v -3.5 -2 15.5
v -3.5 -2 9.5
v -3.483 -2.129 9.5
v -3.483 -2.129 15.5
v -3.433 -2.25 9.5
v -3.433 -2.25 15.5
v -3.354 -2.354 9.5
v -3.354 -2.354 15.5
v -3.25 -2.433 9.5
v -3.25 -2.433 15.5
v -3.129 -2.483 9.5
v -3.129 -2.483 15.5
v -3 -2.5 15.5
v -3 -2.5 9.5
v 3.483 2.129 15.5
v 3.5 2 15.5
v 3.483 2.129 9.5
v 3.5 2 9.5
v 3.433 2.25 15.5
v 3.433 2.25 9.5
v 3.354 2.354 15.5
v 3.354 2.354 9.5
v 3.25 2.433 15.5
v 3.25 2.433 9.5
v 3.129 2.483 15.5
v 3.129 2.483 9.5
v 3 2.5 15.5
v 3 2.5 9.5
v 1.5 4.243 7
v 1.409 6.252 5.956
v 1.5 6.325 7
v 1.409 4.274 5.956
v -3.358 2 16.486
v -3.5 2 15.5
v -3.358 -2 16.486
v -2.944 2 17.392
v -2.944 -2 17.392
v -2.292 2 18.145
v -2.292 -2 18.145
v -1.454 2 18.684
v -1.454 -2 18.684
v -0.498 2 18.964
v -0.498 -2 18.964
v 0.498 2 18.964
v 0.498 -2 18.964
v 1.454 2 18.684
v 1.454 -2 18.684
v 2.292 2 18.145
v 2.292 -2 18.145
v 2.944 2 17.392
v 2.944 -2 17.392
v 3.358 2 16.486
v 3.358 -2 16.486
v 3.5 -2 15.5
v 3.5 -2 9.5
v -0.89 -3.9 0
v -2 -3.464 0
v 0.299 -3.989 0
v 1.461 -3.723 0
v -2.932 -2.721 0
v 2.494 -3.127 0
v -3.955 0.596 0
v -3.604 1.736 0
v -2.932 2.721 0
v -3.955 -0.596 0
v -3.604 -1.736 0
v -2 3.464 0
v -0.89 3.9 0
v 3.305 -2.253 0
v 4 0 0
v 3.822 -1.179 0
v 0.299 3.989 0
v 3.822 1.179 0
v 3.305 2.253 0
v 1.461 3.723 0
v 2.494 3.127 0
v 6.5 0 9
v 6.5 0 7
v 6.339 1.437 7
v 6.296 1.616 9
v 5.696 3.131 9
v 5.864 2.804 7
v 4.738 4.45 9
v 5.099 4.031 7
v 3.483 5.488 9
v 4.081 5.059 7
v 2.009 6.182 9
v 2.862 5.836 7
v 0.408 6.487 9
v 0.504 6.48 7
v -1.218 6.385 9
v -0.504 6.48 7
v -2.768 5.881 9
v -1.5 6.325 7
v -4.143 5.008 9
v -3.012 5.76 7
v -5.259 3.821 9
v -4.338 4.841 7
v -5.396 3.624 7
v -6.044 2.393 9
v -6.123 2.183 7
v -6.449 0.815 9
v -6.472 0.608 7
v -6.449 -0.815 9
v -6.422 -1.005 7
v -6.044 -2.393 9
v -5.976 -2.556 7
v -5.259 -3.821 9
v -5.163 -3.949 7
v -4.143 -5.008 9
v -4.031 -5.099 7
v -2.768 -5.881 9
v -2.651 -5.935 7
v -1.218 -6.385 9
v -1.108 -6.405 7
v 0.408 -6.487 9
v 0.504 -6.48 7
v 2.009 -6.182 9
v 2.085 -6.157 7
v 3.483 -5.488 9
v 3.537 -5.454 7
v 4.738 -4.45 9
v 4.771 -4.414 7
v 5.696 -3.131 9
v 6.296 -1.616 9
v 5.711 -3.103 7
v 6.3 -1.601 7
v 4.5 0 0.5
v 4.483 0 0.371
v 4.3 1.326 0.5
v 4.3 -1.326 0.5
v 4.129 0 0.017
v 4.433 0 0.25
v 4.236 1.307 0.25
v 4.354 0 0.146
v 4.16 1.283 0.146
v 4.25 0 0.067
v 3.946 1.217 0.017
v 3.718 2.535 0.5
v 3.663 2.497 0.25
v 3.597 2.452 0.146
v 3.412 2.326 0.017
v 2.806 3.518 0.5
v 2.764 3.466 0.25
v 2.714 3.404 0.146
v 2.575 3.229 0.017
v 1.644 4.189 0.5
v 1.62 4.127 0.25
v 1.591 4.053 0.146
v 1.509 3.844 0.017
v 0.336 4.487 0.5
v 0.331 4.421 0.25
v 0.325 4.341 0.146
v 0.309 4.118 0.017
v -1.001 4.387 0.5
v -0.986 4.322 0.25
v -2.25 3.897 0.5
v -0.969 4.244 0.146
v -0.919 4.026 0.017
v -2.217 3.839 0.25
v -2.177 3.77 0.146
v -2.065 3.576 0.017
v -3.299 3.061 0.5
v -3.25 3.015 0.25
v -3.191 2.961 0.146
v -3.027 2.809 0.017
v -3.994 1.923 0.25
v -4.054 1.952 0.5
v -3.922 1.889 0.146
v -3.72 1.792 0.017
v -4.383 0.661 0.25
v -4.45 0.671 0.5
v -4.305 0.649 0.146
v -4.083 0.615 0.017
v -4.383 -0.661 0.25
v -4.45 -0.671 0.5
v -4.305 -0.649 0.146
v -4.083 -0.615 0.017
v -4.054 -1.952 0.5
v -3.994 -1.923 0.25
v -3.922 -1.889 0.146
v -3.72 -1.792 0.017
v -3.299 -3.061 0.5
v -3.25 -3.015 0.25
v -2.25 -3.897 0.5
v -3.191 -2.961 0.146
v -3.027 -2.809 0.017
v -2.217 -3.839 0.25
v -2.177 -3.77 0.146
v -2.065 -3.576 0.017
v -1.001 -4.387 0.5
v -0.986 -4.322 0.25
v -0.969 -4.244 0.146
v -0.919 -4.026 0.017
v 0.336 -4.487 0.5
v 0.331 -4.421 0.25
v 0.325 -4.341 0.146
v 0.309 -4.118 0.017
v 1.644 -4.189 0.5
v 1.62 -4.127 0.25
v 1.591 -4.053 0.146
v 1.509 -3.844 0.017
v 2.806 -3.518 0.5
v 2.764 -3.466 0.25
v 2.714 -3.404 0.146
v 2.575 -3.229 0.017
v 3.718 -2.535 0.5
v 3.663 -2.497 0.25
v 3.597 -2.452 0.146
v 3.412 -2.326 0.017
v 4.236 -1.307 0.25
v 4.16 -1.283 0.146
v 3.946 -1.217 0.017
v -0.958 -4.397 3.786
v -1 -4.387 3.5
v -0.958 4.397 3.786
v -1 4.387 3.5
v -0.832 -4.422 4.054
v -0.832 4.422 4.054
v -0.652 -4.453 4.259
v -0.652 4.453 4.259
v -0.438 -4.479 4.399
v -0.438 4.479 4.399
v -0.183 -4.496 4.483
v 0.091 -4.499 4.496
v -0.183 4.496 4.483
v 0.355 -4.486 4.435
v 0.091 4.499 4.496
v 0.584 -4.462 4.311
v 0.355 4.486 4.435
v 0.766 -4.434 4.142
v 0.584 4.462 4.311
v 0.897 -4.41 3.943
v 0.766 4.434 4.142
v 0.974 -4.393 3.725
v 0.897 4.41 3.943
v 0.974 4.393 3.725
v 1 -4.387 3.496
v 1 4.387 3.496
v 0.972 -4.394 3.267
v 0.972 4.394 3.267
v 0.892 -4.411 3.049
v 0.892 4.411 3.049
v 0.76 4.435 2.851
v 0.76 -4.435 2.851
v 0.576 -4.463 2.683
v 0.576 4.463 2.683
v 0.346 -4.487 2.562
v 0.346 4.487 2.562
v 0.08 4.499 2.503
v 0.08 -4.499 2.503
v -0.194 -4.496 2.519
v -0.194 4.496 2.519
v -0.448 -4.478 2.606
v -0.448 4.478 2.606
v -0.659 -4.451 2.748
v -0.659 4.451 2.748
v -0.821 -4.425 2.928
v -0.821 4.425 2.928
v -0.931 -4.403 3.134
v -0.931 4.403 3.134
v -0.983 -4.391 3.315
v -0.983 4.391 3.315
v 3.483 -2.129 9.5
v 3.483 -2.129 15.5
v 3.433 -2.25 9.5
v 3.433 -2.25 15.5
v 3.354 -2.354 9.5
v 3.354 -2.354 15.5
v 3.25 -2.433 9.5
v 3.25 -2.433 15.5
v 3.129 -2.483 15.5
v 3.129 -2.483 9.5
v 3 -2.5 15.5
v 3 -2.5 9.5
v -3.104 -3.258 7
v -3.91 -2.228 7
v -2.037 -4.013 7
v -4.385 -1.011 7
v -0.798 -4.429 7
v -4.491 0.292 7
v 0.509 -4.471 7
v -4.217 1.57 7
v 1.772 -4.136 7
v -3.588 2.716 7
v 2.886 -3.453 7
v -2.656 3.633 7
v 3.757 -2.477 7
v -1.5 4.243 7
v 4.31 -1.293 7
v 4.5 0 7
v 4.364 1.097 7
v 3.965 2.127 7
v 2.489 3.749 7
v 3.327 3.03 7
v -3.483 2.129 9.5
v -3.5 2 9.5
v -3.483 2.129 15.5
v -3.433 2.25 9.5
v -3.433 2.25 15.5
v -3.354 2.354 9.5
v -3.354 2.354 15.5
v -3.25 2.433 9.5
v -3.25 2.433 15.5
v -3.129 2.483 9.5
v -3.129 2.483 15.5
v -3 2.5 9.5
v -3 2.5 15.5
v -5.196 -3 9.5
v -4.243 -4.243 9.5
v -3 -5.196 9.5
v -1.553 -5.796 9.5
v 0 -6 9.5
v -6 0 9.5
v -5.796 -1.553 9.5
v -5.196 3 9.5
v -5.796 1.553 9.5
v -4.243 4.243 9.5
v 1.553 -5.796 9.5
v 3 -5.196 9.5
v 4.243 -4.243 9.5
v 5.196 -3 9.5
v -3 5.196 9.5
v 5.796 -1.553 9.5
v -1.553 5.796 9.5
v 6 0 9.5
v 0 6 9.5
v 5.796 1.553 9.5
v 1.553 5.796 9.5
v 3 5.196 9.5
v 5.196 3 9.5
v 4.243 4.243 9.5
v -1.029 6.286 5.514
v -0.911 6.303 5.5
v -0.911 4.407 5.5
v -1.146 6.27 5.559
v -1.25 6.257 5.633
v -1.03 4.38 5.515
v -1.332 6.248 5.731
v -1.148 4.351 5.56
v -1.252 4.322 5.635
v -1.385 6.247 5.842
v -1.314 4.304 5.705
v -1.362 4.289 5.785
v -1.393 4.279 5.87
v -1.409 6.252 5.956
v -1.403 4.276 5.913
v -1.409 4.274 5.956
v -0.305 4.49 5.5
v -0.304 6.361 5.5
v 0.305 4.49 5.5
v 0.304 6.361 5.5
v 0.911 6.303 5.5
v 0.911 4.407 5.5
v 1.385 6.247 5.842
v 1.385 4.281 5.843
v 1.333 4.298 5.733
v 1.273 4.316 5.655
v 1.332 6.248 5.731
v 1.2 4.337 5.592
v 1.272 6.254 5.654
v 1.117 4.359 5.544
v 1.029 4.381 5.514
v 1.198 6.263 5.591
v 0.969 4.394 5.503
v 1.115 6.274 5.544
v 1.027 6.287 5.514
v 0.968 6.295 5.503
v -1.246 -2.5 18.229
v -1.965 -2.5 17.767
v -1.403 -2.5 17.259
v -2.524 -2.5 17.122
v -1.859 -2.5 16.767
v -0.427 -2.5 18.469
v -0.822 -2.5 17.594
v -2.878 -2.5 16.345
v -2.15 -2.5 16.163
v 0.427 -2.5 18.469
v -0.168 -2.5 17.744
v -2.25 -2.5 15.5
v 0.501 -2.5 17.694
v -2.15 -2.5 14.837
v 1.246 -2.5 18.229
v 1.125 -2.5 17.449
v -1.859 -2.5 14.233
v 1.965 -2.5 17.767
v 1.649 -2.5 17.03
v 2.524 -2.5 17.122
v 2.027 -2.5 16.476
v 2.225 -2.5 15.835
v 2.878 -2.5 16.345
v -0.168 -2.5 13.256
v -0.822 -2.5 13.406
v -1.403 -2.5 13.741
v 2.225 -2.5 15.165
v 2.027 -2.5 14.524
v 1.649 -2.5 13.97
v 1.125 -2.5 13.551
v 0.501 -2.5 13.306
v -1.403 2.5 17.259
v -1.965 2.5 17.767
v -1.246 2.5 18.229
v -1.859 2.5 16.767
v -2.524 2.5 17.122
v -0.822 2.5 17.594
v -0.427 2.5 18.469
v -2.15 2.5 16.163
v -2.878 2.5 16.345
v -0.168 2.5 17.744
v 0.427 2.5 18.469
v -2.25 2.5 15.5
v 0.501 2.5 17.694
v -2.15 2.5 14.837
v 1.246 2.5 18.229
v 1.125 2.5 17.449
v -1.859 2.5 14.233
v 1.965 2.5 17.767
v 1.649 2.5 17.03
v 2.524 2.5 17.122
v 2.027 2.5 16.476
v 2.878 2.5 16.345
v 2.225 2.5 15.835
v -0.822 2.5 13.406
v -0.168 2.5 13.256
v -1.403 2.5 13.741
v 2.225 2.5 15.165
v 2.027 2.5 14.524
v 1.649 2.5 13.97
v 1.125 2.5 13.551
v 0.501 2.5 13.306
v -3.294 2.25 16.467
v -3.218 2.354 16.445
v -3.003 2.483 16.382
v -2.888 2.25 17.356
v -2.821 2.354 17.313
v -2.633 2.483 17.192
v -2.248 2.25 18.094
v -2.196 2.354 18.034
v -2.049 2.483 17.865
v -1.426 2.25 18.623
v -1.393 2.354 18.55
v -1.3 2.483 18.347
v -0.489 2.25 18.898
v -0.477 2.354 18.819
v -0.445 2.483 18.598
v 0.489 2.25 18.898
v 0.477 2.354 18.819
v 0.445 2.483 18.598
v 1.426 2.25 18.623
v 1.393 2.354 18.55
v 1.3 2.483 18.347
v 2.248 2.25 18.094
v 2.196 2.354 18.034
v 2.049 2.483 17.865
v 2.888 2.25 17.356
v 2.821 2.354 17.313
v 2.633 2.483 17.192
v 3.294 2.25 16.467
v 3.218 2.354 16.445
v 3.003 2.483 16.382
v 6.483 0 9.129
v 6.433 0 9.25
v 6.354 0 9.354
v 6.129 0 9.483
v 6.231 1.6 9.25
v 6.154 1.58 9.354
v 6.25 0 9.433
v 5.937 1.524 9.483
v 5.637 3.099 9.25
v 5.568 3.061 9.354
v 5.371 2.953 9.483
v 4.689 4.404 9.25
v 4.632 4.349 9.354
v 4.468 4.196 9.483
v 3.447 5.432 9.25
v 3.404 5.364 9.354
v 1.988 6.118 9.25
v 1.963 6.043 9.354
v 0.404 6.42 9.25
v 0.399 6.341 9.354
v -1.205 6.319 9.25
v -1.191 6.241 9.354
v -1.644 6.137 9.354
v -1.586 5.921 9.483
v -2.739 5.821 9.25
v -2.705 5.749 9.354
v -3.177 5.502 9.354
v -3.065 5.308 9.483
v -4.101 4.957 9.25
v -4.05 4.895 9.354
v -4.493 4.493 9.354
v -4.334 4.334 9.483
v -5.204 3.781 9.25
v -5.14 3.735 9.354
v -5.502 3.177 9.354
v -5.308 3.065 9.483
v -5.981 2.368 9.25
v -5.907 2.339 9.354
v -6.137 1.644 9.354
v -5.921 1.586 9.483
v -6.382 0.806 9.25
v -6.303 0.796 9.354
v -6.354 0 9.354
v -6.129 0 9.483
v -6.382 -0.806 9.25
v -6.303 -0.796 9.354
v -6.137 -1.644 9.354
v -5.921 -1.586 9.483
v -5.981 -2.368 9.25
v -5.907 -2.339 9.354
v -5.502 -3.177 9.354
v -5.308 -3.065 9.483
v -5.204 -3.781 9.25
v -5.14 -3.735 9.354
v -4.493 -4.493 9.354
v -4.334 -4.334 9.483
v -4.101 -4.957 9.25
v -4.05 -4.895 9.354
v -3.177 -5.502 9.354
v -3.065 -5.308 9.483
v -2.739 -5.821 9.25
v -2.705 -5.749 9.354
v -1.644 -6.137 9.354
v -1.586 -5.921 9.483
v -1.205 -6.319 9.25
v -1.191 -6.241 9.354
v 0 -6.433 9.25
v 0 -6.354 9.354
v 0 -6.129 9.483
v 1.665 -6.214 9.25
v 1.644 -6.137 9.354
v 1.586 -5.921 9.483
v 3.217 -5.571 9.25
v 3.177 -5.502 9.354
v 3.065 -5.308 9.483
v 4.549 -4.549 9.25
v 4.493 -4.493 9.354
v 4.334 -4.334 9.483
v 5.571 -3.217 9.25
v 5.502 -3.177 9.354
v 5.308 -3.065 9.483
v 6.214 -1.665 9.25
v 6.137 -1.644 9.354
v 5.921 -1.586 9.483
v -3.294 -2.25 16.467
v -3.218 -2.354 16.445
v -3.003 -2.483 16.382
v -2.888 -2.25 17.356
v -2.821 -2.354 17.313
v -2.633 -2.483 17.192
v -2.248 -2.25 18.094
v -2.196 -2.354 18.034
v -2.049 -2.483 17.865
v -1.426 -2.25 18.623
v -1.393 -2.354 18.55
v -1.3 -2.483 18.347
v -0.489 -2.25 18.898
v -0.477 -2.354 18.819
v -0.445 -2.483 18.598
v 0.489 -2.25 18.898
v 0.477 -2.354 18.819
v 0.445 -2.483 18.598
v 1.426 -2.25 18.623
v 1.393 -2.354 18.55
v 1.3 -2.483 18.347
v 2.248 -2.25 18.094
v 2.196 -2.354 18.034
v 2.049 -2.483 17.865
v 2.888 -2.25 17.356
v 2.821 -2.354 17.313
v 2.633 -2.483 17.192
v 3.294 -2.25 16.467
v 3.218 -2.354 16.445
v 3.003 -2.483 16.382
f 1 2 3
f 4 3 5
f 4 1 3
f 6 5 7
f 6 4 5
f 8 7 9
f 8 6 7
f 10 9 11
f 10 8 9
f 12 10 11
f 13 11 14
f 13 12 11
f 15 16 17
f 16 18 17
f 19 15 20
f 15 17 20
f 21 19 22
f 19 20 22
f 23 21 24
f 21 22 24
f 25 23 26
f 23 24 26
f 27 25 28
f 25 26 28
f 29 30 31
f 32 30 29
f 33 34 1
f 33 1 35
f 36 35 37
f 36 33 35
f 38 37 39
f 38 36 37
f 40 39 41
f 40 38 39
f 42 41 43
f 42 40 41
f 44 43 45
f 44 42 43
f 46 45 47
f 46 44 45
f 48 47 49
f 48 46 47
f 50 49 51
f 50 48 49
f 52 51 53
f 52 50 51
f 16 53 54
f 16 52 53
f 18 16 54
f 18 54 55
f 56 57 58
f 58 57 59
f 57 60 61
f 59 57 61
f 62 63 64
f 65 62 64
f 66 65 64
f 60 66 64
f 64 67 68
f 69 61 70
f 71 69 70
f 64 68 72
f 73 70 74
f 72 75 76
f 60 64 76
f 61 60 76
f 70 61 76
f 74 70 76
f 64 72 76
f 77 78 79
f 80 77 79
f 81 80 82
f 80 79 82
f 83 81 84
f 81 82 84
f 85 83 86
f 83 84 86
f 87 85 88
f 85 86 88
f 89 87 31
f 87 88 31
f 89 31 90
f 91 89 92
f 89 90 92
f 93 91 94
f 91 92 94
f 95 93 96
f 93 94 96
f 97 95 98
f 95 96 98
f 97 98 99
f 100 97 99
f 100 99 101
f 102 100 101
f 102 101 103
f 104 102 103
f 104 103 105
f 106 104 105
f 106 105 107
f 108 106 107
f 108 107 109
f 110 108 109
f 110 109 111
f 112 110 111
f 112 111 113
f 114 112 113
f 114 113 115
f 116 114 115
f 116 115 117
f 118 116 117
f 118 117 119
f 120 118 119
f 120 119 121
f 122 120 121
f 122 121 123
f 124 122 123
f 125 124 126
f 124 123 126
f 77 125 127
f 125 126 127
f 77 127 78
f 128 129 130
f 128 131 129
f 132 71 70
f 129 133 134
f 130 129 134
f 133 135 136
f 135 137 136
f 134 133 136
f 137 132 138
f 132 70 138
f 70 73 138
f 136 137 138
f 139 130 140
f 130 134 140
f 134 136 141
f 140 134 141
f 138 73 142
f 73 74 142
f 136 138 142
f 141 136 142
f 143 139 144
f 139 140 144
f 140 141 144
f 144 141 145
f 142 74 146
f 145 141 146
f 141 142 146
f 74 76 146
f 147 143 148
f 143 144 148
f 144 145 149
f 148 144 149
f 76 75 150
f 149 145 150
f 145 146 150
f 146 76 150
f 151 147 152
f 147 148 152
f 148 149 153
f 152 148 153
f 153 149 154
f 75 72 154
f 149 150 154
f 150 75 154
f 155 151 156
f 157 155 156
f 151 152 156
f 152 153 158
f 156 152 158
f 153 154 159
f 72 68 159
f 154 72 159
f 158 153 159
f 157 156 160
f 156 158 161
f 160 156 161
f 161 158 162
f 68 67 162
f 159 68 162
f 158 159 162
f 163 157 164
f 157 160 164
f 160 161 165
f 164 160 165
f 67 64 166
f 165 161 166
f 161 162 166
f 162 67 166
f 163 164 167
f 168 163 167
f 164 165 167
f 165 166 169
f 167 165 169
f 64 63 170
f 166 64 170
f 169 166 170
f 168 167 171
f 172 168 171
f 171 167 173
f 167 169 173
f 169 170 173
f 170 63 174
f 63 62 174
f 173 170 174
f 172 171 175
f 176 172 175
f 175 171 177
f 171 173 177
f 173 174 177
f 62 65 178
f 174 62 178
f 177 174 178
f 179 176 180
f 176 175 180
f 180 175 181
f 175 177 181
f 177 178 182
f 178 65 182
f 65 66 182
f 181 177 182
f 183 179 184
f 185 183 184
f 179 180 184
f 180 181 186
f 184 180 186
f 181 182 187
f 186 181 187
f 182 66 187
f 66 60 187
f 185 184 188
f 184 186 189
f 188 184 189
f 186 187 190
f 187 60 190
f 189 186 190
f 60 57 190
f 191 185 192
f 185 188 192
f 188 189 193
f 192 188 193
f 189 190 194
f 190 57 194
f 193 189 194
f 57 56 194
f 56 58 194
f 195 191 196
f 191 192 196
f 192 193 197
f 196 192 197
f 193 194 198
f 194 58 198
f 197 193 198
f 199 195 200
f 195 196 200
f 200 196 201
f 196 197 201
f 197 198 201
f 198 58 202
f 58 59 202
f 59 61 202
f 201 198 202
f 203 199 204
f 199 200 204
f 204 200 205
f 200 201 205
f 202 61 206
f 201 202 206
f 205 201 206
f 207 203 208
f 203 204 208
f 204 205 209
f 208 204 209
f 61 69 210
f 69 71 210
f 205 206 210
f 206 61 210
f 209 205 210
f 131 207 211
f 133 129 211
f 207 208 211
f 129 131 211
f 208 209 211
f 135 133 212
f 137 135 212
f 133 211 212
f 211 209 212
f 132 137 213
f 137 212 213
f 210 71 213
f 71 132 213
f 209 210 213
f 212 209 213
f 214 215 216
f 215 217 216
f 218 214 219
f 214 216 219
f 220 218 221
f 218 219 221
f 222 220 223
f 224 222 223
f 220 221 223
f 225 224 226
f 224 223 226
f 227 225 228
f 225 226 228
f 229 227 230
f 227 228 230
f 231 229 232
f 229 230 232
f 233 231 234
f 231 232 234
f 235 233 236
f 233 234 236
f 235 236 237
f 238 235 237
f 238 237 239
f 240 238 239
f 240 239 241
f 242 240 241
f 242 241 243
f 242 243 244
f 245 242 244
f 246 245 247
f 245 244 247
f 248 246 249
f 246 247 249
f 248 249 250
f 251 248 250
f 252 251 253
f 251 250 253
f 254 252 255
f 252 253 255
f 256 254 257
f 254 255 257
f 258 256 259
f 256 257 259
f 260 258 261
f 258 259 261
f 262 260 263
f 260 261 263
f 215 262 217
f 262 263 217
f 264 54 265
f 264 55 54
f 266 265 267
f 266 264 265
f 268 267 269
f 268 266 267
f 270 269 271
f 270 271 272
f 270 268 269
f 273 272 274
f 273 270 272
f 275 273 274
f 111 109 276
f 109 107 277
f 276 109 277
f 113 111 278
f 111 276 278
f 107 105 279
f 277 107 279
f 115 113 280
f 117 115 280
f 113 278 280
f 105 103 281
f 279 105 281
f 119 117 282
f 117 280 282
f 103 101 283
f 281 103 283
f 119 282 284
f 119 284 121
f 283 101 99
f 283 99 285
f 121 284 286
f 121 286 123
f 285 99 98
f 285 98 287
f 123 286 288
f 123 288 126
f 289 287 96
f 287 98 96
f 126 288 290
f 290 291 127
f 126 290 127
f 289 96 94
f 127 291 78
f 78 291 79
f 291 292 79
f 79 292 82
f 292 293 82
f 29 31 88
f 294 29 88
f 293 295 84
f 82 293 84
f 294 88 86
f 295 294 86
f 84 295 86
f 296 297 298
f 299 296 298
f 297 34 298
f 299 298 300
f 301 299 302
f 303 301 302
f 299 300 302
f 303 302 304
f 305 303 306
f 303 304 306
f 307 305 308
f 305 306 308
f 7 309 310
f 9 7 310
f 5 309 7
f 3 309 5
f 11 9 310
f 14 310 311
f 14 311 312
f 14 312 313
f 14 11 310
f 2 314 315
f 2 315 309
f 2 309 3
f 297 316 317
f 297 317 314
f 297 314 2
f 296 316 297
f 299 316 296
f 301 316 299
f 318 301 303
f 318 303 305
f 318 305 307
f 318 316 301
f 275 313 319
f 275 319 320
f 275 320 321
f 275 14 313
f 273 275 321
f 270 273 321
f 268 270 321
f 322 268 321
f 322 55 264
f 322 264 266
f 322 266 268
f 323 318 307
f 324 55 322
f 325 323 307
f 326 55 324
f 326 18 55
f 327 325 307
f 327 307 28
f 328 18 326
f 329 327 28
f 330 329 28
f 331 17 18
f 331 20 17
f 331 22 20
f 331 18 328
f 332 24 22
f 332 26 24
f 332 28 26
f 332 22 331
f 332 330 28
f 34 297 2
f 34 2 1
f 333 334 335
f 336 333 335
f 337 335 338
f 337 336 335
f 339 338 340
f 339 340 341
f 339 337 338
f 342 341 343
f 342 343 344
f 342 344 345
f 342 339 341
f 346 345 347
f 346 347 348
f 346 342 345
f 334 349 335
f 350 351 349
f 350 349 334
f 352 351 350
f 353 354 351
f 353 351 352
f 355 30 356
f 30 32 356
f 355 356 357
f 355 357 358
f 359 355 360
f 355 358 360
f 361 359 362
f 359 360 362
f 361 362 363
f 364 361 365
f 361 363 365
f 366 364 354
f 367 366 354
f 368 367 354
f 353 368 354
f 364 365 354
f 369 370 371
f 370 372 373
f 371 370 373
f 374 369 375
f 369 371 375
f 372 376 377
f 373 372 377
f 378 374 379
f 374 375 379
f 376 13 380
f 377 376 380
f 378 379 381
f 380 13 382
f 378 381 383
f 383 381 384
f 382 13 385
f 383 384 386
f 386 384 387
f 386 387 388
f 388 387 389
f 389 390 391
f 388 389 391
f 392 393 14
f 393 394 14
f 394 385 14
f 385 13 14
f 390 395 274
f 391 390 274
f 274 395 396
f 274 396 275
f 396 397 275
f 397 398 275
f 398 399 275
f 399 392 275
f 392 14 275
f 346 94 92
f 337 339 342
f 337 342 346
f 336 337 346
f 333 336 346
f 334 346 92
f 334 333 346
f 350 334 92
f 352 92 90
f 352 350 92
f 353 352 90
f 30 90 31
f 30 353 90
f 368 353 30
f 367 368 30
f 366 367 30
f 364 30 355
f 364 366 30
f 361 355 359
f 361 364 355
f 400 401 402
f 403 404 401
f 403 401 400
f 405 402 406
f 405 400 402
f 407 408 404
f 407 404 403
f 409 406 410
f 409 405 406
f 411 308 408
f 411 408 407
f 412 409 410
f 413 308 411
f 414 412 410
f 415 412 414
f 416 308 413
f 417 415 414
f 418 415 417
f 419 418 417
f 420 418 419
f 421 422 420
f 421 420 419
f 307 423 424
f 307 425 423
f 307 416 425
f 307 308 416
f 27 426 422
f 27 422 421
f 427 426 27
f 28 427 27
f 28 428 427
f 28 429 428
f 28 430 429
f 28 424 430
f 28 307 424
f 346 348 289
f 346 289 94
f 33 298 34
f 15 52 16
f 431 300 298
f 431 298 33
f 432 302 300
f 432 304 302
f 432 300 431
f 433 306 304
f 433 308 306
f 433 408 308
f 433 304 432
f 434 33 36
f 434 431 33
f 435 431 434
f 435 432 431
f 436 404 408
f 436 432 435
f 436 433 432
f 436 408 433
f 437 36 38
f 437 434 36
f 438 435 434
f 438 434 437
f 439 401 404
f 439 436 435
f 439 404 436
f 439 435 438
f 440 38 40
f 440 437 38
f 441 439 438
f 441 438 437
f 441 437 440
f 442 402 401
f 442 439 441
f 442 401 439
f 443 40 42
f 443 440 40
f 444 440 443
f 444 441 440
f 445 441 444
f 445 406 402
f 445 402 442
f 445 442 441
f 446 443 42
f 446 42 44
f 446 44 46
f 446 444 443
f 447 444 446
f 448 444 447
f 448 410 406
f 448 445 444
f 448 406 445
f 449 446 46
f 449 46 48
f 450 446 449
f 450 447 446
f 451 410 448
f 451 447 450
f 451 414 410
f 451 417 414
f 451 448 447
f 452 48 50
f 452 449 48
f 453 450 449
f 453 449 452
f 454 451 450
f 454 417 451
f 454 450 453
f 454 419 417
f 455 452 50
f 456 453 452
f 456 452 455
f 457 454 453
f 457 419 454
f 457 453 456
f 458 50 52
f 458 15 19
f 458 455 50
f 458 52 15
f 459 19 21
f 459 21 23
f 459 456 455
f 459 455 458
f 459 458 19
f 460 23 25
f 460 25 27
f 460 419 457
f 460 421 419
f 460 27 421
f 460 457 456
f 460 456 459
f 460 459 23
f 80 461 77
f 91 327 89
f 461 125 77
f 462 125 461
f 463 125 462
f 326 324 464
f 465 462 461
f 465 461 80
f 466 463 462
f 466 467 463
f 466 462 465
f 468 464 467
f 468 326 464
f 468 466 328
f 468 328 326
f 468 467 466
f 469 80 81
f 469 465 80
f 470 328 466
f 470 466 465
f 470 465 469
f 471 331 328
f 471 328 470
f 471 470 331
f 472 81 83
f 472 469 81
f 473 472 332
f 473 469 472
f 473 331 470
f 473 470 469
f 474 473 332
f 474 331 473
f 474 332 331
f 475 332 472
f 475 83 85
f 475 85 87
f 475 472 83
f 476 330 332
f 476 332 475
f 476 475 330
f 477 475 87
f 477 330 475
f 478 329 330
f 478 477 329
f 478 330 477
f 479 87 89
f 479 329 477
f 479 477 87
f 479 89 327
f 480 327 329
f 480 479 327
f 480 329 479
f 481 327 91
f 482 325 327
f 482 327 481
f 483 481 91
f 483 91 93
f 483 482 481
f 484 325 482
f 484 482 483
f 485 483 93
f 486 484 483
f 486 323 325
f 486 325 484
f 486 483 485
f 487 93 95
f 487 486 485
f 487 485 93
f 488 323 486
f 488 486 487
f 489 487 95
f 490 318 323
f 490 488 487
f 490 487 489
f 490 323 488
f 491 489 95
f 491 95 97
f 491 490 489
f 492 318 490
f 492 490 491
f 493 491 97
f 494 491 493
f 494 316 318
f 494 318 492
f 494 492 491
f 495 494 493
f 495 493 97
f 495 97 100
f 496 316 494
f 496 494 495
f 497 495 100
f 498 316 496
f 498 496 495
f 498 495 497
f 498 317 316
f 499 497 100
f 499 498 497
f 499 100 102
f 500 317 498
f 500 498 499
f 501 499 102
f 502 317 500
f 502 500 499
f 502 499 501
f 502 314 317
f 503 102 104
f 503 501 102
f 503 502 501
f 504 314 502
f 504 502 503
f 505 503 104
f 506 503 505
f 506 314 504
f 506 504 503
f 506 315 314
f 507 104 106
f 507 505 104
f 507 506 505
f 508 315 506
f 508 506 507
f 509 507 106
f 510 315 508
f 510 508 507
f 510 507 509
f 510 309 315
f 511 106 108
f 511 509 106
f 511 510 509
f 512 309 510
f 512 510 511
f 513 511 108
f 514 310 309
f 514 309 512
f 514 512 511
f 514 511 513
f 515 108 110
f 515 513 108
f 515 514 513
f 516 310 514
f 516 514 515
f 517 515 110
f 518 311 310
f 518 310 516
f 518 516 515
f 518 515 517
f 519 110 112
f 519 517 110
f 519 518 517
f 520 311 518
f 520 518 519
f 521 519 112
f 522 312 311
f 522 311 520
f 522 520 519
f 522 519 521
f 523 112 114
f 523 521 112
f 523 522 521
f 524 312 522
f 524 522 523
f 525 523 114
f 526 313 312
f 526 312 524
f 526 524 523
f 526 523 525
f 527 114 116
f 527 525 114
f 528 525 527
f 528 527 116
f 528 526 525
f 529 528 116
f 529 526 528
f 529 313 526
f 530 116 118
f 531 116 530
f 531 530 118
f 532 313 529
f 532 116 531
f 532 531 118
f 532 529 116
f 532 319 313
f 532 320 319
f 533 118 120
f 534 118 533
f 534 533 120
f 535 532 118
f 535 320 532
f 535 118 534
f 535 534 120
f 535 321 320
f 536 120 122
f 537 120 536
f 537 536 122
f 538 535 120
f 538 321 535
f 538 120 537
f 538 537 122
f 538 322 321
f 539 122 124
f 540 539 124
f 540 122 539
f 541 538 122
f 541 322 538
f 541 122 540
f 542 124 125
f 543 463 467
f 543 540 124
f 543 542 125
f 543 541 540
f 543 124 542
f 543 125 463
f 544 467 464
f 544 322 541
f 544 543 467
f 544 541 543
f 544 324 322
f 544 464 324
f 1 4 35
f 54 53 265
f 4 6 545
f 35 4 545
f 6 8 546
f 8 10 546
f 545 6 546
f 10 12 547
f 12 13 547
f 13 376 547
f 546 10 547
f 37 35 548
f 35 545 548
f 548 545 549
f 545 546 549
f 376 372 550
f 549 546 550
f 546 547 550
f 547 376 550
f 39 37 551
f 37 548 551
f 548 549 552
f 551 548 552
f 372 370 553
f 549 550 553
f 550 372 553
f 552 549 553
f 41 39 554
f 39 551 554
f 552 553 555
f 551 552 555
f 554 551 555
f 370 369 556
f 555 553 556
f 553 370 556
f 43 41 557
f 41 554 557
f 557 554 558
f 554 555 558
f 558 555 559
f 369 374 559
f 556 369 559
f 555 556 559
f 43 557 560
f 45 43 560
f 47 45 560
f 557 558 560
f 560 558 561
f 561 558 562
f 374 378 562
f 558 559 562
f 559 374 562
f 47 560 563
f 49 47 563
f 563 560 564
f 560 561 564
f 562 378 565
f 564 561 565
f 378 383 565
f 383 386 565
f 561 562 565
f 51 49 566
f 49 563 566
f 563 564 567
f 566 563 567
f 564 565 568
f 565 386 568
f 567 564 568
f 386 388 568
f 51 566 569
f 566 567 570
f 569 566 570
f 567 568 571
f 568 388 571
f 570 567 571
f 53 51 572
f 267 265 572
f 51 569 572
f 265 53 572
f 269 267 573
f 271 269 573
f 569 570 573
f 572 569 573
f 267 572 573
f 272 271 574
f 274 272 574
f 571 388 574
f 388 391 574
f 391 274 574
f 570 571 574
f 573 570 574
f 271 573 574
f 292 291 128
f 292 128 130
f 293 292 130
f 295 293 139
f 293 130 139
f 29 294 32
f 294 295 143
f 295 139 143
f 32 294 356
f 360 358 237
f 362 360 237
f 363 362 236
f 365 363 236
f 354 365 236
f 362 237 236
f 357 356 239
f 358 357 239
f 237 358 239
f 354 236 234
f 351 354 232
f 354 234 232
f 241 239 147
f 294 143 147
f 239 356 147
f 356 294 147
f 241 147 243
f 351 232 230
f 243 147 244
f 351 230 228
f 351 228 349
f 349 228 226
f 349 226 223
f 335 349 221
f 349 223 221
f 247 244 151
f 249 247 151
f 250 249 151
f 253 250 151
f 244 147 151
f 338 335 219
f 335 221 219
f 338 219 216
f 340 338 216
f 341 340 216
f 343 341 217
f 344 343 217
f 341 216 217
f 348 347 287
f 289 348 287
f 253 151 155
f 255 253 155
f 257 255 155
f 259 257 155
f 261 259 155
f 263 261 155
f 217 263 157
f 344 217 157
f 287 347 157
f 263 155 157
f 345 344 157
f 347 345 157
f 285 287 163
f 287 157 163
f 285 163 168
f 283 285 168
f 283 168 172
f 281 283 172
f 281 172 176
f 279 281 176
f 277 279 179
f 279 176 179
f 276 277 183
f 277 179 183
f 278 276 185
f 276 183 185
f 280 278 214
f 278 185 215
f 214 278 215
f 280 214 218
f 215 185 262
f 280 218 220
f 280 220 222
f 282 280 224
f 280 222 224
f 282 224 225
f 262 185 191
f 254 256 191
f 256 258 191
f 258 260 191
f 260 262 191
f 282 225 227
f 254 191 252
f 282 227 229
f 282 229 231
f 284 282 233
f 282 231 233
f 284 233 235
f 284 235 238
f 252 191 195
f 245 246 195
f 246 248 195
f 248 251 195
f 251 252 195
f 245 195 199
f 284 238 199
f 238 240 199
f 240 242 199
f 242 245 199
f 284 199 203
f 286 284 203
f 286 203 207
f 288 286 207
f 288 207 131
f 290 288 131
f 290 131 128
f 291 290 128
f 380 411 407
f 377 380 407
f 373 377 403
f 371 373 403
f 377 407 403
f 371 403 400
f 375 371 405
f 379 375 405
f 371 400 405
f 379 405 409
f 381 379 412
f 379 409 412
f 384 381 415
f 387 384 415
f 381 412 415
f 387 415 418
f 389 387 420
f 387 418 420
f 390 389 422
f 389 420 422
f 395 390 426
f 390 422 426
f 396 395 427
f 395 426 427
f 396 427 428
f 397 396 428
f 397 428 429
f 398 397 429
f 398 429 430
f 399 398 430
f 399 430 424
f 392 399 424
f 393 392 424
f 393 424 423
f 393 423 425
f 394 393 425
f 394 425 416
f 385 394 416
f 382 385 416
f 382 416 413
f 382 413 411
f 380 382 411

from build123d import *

# Parameters (mm, degrees)
ESQUISSE1_R             = 4.5
BASE_EXTRUSION_DEPTH    = 7
ESQUISSE2_R             = 6.5
BOSS_EXTRU_1_DEPTH      = 2.5
BOSS_EXTRU_2_DEPTH      = 2.5
ESQUISSE4_R             = 2.25
ESQUISSE4_R_2           = 1
ENL_V_MAT_EXTRU_1_DEPTH = 22.5
BOSS_EXTRU_3_DEPTH      = 1.5
BOSS_EXTRU_3_TAPER      = 5
CONG_1_R                = 0.5


with BuildPart() as part:
    # Esquisse1 → Base-Extrusion (new body)
    with BuildSketch(Plane.XY):
        Circle(ESQUISSE1_R)
    extrude(amount=BASE_EXTRUSION_DEPTH)

    # Esquisse2 → Boss.-Extru.1 (add)
    with BuildSketch(Plane.XY.offset(7)):
        Circle(ESQUISSE2_R)
    extrude(amount=BOSS_EXTRU_1_DEPTH)

    # Esquisse3 → Boss.-Extru.2 (add, symmetric)
    with BuildSketch(Plane(origin=(0, 0, 0), x_dir=(1, 0, 0), z_dir=(0, 1, 0))):
        with BuildLine():
            Line((-3.5, -9.5), (-3.5, -15.5))
            ThreePointArc((-3.5, -15.5), (0, -19), (3.5, -15.5))
            Line((3.5, -15.5), (3.5, -9.5))
            Line((3.5, -9.5), (-3.5, -9.5))
        make_face()
    extrude(amount=BOSS_EXTRU_2_DEPTH, both=True)

    # Esquisse4 → Enlèv. mat.-Extru.1 (cut, symmetric)
    with BuildSketch(Plane(origin=(0, 2.5, 0), x_dir=(-1, 0, 0), z_dir=(0, 1, 0))):
        with Locations((0, 15.5)):
            Circle(ESQUISSE4_R)
        with Locations((0, 3.5)):
            Circle(ESQUISSE4_R_2)
    extrude(amount=ENL_V_MAT_EXTRU_1_DEPTH, both=True, mode=Mode.SUBTRACT)

    # Esquisse5 → Boss.-Extru.3 (add)
    with BuildSketch(Plane(origin=(0, 0, 7), x_dir=(-1, 0, 0), z_dir=(0, 0, -1))):
        with BuildLine():
            ThreePointArc((1.5, 6.32455532), (0, 6.5), (-1.5, 6.32455532))
            Line((-1.5, 6.32455532), (-1.5, 4))
            Line((-1.5, 4), (1.5, 4))
            Line((1.5, 4), (1.5, 6.32455532))
        make_face()
    extrude(amount=BOSS_EXTRU_3_DEPTH, taper=BOSS_EXTRU_3_TAPER)

    # Congé1
    cong_1_edges = [part.edges().sort_by_distance(p)[0] for p in [
        (-6.5, 0, 9.5),
        (-1.368767005, 5.253360318, 5.5),
        (-4.5, 0, 0),
        (1.368767005, 5.253360318, 5.5),
        (-3.5, -2.5, 12.5),
        (-3.5, 2.5, 12.5),
        (0, -2.5, 19),
        (3.5, -2.5, 12.5),
        (3.5, 2.5, 12.5),
        (0, 2.5, 19),
    ]]
    fillet(cong_1_edges, radius=CONG_1_R)


solid = part.part
